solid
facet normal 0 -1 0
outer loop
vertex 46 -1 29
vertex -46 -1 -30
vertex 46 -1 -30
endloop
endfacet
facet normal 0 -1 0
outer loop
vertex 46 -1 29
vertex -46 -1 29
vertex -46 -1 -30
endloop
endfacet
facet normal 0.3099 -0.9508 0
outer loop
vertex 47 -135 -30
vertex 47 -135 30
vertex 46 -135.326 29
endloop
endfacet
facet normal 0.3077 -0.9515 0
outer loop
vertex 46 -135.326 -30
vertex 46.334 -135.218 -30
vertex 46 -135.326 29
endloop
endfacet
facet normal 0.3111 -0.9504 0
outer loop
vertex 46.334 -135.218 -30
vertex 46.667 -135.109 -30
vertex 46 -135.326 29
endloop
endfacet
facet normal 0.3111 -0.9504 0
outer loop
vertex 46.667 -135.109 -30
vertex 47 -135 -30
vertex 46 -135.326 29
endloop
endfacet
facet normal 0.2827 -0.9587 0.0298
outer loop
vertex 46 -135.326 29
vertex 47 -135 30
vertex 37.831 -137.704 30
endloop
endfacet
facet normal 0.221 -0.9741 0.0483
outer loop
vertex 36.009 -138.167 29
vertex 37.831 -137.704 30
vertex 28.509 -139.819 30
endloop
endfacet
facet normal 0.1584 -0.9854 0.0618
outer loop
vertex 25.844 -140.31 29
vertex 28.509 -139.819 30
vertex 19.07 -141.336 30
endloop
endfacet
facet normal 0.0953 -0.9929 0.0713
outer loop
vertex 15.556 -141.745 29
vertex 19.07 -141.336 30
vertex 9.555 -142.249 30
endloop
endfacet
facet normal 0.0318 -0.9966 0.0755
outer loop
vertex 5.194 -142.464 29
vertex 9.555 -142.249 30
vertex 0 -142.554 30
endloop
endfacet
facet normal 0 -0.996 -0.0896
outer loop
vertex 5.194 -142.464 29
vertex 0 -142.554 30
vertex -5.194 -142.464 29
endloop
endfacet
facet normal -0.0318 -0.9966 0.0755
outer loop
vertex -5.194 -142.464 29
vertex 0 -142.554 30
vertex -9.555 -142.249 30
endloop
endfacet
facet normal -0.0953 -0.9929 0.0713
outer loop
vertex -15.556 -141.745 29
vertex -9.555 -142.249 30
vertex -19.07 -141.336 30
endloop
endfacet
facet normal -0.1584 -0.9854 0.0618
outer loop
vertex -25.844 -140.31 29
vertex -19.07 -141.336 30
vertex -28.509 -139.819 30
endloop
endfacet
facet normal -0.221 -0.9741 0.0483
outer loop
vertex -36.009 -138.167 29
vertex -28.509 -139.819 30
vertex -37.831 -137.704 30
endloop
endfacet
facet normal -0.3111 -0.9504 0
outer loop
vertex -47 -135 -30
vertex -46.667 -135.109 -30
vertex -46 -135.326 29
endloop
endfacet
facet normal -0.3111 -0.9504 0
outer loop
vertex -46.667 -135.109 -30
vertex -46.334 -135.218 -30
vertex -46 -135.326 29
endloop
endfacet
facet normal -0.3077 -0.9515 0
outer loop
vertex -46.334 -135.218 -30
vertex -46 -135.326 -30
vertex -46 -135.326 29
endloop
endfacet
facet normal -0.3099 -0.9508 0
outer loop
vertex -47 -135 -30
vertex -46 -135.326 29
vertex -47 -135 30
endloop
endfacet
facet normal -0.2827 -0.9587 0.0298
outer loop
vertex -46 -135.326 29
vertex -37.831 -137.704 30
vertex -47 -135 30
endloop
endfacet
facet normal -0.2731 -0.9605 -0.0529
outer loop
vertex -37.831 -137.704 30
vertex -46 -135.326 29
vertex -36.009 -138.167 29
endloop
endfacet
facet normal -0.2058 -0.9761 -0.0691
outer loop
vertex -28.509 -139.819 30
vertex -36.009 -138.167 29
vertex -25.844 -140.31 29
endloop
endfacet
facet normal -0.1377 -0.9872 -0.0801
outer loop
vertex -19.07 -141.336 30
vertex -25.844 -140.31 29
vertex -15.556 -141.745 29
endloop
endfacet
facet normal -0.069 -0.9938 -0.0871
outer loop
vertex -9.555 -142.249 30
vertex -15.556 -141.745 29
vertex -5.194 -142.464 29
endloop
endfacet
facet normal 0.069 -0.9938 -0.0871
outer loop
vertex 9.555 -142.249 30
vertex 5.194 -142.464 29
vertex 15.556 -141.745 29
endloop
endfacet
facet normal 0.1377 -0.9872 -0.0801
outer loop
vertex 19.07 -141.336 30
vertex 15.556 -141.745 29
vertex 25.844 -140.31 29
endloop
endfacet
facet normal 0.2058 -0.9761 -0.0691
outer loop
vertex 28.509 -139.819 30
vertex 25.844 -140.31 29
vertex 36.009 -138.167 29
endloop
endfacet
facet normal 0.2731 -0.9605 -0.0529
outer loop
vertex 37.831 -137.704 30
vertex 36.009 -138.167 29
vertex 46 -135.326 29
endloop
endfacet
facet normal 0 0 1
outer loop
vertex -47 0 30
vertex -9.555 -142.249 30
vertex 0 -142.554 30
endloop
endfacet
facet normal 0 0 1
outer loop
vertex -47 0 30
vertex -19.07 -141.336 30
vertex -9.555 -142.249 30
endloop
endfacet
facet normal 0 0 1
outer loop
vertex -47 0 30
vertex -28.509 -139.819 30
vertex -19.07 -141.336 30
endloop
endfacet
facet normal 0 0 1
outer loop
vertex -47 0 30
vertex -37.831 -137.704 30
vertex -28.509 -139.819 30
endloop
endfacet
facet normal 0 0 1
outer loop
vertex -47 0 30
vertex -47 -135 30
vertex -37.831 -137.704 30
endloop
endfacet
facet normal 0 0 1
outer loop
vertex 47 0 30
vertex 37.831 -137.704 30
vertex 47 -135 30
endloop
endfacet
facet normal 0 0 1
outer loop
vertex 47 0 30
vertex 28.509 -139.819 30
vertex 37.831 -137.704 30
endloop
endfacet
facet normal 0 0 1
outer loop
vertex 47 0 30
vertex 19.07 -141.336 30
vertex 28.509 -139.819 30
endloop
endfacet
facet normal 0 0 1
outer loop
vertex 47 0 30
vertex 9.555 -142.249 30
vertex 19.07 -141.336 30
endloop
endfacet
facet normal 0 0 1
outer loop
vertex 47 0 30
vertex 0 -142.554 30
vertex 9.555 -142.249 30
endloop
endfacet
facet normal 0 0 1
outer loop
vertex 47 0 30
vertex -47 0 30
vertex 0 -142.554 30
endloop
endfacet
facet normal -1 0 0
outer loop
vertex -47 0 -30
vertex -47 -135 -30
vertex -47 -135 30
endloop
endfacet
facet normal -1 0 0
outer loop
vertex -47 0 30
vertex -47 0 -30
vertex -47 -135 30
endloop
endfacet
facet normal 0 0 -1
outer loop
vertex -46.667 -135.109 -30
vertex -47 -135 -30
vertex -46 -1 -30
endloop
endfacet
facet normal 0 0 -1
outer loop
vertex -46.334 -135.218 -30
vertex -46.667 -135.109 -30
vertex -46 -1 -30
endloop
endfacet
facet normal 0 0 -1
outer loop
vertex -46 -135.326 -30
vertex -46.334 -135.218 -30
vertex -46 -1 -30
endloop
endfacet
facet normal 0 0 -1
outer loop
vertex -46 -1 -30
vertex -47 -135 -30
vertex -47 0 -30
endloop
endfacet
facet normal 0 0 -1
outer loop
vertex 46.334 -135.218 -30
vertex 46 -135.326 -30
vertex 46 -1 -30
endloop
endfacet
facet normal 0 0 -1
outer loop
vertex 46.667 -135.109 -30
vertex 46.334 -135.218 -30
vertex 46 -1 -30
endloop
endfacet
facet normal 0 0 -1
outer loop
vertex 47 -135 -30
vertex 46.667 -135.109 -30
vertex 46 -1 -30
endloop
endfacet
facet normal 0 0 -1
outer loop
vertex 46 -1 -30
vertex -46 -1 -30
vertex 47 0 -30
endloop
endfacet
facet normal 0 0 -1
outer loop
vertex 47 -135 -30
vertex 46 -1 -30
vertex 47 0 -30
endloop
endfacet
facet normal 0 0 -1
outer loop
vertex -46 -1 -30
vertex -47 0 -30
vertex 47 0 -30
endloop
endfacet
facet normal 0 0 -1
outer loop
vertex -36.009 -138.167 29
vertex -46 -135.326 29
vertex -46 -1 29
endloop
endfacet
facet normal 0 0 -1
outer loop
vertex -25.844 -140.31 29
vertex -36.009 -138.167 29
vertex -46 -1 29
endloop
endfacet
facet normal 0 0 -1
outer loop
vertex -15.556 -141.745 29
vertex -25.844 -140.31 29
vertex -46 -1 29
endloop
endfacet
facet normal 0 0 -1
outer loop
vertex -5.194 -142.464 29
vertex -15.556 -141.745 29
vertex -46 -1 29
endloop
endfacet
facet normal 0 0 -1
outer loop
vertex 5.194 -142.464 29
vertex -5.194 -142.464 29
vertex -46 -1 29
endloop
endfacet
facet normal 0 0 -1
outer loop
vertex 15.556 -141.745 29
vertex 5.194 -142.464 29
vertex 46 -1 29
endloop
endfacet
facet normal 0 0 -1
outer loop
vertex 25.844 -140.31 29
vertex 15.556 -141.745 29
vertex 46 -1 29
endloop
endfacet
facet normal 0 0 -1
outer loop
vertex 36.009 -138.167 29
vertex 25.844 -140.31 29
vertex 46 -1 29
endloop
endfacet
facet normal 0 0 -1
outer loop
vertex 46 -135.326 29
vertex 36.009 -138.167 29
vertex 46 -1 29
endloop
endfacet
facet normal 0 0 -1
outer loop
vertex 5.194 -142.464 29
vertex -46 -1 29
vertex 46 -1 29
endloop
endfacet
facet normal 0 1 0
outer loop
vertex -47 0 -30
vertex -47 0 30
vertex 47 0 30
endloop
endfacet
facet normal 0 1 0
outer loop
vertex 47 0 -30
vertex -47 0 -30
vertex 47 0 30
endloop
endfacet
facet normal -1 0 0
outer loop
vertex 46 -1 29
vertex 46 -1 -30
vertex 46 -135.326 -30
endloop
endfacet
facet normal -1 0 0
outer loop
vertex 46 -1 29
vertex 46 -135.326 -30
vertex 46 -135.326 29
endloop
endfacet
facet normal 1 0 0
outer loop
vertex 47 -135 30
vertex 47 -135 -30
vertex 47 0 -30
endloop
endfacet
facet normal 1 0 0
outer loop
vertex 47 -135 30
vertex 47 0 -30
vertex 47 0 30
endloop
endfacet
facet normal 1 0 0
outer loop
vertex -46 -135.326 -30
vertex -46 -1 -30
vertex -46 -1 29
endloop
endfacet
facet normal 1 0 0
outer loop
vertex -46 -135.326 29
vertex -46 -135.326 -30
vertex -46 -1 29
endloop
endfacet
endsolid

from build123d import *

# Parameters (mm, degrees)
F0_W     = 94
F0_H     = 60
F1_DEPTH = 150
F2_T     = -1
F4_DEPTH = 60.001


with BuildPart() as f1:
    # F0 (on Front) → F1 (new body)
    with BuildSketch(Plane.XZ):
        Rectangle(F0_W, F0_H)
    extrude(amount=F1_DEPTH)

    # F2
    f2_openings = [f1.faces().sort_by_distance(p)[0] for p in [
        (0, -150, 0),
        (0, -75, -30),
    ]]
    offset(amount=F2_T, openings=f2_openings)

    # F3 (on face) → F4 (cut, through all)
    with BuildSketch(Plane.XY.offset(30)):
        with BuildLine():
            Line((47, -150), (47, -135))
            ThreePointArc((47, -135), (0, -142.553519), (-47, -135))
            Line((-47, -135), (-47, -150))
            Line((-47, -150), (47, -150))
        make_face()
    extrude(amount=-F4_DEPTH, mode=Mode.SUBTRACT)


solid = f1.part
